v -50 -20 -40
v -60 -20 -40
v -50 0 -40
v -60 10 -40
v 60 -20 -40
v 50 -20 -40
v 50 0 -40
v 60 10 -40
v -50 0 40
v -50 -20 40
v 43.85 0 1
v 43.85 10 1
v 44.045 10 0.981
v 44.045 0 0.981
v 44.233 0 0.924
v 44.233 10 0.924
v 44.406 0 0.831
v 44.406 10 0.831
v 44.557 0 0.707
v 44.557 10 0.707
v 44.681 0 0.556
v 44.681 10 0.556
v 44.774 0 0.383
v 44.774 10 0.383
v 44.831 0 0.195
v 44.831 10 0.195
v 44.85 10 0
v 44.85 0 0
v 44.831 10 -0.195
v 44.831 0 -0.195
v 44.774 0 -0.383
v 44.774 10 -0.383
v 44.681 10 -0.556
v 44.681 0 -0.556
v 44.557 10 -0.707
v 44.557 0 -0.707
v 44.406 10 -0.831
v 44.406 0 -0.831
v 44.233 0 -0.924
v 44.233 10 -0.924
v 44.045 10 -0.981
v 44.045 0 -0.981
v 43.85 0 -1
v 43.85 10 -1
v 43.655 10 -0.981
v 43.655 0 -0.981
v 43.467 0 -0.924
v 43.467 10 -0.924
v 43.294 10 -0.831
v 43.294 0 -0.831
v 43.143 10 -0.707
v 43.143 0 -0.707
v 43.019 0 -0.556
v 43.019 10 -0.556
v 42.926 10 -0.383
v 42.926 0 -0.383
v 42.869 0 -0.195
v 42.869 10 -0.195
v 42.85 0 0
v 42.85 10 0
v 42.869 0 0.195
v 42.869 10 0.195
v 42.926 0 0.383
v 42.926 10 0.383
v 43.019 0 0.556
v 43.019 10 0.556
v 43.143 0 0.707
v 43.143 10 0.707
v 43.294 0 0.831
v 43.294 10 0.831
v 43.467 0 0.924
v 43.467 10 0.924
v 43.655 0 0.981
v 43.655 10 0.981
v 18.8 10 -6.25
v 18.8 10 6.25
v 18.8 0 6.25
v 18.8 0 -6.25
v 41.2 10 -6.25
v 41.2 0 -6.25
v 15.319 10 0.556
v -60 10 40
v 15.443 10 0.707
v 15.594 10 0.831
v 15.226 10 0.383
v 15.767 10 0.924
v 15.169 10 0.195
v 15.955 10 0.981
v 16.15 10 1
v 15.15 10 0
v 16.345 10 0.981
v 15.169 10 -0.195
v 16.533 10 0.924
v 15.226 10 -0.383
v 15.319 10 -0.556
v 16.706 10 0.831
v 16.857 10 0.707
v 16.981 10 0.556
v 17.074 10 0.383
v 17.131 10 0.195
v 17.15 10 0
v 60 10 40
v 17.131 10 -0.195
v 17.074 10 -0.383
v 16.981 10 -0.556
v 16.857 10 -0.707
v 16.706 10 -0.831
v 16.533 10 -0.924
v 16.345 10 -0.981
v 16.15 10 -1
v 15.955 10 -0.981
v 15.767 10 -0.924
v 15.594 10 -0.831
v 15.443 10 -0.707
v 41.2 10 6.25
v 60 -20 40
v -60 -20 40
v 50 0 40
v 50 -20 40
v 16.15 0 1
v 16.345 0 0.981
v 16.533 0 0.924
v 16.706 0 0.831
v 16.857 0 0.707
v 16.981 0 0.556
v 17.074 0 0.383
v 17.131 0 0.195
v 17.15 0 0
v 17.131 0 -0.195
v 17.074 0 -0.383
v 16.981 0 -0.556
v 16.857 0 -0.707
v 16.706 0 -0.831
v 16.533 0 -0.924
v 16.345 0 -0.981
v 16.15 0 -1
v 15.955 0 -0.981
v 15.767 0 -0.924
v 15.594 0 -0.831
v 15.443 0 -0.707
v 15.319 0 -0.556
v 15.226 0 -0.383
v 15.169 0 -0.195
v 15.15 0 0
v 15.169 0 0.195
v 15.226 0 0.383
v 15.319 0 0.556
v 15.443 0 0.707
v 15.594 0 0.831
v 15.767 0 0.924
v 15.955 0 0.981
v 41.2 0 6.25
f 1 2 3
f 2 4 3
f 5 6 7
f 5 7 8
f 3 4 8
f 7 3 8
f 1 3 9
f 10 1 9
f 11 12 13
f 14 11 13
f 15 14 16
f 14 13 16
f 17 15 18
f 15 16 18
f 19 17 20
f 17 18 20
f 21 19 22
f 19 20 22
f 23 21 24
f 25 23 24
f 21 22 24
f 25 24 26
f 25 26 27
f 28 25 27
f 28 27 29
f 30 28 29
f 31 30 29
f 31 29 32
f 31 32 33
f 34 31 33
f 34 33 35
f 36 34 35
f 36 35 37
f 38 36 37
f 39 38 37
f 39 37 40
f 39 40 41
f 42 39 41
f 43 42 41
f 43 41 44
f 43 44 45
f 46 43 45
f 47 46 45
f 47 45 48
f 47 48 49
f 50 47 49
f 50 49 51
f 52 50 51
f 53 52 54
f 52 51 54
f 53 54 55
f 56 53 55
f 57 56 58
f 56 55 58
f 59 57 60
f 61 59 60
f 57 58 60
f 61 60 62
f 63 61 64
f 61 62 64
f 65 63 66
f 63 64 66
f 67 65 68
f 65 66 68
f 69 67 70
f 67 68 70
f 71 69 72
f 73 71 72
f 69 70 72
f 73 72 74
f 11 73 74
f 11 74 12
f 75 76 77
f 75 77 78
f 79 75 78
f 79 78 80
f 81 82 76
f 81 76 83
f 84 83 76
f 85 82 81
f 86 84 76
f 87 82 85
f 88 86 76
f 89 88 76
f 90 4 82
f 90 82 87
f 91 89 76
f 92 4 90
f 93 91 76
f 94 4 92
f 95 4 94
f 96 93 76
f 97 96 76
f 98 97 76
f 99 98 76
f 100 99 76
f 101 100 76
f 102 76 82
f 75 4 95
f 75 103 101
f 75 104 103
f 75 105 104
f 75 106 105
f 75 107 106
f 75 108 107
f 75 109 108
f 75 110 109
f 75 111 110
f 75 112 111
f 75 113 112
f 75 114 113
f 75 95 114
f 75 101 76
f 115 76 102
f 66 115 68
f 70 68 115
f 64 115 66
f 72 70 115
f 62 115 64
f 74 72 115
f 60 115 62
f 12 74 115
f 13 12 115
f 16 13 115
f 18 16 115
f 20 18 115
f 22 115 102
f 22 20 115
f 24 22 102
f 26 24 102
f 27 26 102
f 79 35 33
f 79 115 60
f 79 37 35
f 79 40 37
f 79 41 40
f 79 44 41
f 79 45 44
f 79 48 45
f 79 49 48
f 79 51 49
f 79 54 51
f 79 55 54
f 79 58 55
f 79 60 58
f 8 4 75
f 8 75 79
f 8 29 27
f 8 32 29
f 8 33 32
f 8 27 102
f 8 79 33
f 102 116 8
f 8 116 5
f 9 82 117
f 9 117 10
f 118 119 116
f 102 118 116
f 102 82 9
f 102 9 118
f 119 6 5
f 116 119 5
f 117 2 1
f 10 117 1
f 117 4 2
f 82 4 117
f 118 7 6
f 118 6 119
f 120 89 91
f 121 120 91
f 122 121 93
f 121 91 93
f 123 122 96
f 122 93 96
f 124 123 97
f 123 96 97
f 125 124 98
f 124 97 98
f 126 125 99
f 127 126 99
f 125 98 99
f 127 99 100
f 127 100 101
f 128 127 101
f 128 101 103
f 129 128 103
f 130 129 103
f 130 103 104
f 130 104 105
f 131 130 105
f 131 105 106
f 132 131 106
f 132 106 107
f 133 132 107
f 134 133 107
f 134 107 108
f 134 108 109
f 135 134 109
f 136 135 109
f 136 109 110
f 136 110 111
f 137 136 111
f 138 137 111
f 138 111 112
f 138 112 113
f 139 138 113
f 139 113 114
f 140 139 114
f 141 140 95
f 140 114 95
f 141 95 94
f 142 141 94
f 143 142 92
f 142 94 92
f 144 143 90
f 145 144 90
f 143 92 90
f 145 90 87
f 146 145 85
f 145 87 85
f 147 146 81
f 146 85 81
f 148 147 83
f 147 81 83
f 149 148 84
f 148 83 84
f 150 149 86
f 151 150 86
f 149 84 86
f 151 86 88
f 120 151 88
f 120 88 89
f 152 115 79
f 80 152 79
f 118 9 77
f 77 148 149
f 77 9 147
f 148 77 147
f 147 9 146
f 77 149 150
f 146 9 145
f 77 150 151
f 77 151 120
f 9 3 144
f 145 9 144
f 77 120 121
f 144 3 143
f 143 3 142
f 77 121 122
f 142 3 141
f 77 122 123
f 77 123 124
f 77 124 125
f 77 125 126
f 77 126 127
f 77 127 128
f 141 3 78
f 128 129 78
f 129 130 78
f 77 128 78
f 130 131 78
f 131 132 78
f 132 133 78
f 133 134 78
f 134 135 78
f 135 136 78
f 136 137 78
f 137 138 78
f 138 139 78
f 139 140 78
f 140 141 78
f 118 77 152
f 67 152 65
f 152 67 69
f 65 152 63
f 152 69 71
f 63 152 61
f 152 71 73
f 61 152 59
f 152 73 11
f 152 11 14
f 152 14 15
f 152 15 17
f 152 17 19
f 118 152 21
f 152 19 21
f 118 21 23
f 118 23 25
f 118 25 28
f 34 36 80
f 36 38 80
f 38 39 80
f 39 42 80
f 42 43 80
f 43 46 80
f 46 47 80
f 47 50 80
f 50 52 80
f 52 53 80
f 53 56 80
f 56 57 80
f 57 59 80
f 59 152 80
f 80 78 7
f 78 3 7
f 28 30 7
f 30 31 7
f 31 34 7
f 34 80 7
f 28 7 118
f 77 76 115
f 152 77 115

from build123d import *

# Parameters (mm, degrees)
SKETCH1_W           = 120
SKETCH1_H           = 80
BOSS_EXTRUDE1_DEPTH = 10
SKETCH2_W           = 22.4
SKETCH2_H           = 12.5
CUT_EXTRUDE1_DEPTH  = 10
SKETCH3_W           = 10
SKETCH3_H           = 80
BOSS_EXTRUDE2_DEPTH = 20
SKETCH4_R           = 1
CUT_EXTRUDE3_DEPTH  = 12


with BuildPart() as part:
    # Sketch1 → Boss-Extrude1 (new body)
    with BuildSketch(Plane(origin=(0, 0, 0), x_dir=(1, 0, 0), z_dir=(0, 1, 0))):
        Rectangle(SKETCH1_W, SKETCH1_H)
    extrude(amount=BOSS_EXTRUDE1_DEPTH)

    # Sketch2 → Cut-Extrude1 (cut)
    with BuildSketch(Plane(origin=(0, 10, 0), x_dir=(1, 0, 0), z_dir=(0, 1, 0))):
        with Locations((30, 0)):
            Rectangle(SKETCH2_W, SKETCH2_H)
    extrude(amount=-CUT_EXTRUDE1_DEPTH, mode=Mode.SUBTRACT)

    # Sketch3 → Boss-Extrude2 (add)
    with BuildSketch(Plane.XZ):
        with Locations((-55, 0)):
            Rectangle(SKETCH3_W, SKETCH3_H)
        with Locations((55, 0)):
            Rectangle(SKETCH3_W, SKETCH3_H)
    extrude(amount=BOSS_EXTRUDE2_DEPTH)

    # Sketch4 → Cut-Extrude3 (cut)
    with BuildSketch(Plane(origin=(0, 10, 0), x_dir=(1, 0, 0), z_dir=(0, 1, 0))):
        with Locations(Location((16.15, 0, 0), (0, 0, 270))):
            Circle(SKETCH4_R)
        with Locations(Location((43.85, 0, 0), (0, 0, 270))):
            Circle(SKETCH4_R)
    extrude(amount=-CUT_EXTRUDE3_DEPTH, mode=Mode.SUBTRACT)


solid = part.part
